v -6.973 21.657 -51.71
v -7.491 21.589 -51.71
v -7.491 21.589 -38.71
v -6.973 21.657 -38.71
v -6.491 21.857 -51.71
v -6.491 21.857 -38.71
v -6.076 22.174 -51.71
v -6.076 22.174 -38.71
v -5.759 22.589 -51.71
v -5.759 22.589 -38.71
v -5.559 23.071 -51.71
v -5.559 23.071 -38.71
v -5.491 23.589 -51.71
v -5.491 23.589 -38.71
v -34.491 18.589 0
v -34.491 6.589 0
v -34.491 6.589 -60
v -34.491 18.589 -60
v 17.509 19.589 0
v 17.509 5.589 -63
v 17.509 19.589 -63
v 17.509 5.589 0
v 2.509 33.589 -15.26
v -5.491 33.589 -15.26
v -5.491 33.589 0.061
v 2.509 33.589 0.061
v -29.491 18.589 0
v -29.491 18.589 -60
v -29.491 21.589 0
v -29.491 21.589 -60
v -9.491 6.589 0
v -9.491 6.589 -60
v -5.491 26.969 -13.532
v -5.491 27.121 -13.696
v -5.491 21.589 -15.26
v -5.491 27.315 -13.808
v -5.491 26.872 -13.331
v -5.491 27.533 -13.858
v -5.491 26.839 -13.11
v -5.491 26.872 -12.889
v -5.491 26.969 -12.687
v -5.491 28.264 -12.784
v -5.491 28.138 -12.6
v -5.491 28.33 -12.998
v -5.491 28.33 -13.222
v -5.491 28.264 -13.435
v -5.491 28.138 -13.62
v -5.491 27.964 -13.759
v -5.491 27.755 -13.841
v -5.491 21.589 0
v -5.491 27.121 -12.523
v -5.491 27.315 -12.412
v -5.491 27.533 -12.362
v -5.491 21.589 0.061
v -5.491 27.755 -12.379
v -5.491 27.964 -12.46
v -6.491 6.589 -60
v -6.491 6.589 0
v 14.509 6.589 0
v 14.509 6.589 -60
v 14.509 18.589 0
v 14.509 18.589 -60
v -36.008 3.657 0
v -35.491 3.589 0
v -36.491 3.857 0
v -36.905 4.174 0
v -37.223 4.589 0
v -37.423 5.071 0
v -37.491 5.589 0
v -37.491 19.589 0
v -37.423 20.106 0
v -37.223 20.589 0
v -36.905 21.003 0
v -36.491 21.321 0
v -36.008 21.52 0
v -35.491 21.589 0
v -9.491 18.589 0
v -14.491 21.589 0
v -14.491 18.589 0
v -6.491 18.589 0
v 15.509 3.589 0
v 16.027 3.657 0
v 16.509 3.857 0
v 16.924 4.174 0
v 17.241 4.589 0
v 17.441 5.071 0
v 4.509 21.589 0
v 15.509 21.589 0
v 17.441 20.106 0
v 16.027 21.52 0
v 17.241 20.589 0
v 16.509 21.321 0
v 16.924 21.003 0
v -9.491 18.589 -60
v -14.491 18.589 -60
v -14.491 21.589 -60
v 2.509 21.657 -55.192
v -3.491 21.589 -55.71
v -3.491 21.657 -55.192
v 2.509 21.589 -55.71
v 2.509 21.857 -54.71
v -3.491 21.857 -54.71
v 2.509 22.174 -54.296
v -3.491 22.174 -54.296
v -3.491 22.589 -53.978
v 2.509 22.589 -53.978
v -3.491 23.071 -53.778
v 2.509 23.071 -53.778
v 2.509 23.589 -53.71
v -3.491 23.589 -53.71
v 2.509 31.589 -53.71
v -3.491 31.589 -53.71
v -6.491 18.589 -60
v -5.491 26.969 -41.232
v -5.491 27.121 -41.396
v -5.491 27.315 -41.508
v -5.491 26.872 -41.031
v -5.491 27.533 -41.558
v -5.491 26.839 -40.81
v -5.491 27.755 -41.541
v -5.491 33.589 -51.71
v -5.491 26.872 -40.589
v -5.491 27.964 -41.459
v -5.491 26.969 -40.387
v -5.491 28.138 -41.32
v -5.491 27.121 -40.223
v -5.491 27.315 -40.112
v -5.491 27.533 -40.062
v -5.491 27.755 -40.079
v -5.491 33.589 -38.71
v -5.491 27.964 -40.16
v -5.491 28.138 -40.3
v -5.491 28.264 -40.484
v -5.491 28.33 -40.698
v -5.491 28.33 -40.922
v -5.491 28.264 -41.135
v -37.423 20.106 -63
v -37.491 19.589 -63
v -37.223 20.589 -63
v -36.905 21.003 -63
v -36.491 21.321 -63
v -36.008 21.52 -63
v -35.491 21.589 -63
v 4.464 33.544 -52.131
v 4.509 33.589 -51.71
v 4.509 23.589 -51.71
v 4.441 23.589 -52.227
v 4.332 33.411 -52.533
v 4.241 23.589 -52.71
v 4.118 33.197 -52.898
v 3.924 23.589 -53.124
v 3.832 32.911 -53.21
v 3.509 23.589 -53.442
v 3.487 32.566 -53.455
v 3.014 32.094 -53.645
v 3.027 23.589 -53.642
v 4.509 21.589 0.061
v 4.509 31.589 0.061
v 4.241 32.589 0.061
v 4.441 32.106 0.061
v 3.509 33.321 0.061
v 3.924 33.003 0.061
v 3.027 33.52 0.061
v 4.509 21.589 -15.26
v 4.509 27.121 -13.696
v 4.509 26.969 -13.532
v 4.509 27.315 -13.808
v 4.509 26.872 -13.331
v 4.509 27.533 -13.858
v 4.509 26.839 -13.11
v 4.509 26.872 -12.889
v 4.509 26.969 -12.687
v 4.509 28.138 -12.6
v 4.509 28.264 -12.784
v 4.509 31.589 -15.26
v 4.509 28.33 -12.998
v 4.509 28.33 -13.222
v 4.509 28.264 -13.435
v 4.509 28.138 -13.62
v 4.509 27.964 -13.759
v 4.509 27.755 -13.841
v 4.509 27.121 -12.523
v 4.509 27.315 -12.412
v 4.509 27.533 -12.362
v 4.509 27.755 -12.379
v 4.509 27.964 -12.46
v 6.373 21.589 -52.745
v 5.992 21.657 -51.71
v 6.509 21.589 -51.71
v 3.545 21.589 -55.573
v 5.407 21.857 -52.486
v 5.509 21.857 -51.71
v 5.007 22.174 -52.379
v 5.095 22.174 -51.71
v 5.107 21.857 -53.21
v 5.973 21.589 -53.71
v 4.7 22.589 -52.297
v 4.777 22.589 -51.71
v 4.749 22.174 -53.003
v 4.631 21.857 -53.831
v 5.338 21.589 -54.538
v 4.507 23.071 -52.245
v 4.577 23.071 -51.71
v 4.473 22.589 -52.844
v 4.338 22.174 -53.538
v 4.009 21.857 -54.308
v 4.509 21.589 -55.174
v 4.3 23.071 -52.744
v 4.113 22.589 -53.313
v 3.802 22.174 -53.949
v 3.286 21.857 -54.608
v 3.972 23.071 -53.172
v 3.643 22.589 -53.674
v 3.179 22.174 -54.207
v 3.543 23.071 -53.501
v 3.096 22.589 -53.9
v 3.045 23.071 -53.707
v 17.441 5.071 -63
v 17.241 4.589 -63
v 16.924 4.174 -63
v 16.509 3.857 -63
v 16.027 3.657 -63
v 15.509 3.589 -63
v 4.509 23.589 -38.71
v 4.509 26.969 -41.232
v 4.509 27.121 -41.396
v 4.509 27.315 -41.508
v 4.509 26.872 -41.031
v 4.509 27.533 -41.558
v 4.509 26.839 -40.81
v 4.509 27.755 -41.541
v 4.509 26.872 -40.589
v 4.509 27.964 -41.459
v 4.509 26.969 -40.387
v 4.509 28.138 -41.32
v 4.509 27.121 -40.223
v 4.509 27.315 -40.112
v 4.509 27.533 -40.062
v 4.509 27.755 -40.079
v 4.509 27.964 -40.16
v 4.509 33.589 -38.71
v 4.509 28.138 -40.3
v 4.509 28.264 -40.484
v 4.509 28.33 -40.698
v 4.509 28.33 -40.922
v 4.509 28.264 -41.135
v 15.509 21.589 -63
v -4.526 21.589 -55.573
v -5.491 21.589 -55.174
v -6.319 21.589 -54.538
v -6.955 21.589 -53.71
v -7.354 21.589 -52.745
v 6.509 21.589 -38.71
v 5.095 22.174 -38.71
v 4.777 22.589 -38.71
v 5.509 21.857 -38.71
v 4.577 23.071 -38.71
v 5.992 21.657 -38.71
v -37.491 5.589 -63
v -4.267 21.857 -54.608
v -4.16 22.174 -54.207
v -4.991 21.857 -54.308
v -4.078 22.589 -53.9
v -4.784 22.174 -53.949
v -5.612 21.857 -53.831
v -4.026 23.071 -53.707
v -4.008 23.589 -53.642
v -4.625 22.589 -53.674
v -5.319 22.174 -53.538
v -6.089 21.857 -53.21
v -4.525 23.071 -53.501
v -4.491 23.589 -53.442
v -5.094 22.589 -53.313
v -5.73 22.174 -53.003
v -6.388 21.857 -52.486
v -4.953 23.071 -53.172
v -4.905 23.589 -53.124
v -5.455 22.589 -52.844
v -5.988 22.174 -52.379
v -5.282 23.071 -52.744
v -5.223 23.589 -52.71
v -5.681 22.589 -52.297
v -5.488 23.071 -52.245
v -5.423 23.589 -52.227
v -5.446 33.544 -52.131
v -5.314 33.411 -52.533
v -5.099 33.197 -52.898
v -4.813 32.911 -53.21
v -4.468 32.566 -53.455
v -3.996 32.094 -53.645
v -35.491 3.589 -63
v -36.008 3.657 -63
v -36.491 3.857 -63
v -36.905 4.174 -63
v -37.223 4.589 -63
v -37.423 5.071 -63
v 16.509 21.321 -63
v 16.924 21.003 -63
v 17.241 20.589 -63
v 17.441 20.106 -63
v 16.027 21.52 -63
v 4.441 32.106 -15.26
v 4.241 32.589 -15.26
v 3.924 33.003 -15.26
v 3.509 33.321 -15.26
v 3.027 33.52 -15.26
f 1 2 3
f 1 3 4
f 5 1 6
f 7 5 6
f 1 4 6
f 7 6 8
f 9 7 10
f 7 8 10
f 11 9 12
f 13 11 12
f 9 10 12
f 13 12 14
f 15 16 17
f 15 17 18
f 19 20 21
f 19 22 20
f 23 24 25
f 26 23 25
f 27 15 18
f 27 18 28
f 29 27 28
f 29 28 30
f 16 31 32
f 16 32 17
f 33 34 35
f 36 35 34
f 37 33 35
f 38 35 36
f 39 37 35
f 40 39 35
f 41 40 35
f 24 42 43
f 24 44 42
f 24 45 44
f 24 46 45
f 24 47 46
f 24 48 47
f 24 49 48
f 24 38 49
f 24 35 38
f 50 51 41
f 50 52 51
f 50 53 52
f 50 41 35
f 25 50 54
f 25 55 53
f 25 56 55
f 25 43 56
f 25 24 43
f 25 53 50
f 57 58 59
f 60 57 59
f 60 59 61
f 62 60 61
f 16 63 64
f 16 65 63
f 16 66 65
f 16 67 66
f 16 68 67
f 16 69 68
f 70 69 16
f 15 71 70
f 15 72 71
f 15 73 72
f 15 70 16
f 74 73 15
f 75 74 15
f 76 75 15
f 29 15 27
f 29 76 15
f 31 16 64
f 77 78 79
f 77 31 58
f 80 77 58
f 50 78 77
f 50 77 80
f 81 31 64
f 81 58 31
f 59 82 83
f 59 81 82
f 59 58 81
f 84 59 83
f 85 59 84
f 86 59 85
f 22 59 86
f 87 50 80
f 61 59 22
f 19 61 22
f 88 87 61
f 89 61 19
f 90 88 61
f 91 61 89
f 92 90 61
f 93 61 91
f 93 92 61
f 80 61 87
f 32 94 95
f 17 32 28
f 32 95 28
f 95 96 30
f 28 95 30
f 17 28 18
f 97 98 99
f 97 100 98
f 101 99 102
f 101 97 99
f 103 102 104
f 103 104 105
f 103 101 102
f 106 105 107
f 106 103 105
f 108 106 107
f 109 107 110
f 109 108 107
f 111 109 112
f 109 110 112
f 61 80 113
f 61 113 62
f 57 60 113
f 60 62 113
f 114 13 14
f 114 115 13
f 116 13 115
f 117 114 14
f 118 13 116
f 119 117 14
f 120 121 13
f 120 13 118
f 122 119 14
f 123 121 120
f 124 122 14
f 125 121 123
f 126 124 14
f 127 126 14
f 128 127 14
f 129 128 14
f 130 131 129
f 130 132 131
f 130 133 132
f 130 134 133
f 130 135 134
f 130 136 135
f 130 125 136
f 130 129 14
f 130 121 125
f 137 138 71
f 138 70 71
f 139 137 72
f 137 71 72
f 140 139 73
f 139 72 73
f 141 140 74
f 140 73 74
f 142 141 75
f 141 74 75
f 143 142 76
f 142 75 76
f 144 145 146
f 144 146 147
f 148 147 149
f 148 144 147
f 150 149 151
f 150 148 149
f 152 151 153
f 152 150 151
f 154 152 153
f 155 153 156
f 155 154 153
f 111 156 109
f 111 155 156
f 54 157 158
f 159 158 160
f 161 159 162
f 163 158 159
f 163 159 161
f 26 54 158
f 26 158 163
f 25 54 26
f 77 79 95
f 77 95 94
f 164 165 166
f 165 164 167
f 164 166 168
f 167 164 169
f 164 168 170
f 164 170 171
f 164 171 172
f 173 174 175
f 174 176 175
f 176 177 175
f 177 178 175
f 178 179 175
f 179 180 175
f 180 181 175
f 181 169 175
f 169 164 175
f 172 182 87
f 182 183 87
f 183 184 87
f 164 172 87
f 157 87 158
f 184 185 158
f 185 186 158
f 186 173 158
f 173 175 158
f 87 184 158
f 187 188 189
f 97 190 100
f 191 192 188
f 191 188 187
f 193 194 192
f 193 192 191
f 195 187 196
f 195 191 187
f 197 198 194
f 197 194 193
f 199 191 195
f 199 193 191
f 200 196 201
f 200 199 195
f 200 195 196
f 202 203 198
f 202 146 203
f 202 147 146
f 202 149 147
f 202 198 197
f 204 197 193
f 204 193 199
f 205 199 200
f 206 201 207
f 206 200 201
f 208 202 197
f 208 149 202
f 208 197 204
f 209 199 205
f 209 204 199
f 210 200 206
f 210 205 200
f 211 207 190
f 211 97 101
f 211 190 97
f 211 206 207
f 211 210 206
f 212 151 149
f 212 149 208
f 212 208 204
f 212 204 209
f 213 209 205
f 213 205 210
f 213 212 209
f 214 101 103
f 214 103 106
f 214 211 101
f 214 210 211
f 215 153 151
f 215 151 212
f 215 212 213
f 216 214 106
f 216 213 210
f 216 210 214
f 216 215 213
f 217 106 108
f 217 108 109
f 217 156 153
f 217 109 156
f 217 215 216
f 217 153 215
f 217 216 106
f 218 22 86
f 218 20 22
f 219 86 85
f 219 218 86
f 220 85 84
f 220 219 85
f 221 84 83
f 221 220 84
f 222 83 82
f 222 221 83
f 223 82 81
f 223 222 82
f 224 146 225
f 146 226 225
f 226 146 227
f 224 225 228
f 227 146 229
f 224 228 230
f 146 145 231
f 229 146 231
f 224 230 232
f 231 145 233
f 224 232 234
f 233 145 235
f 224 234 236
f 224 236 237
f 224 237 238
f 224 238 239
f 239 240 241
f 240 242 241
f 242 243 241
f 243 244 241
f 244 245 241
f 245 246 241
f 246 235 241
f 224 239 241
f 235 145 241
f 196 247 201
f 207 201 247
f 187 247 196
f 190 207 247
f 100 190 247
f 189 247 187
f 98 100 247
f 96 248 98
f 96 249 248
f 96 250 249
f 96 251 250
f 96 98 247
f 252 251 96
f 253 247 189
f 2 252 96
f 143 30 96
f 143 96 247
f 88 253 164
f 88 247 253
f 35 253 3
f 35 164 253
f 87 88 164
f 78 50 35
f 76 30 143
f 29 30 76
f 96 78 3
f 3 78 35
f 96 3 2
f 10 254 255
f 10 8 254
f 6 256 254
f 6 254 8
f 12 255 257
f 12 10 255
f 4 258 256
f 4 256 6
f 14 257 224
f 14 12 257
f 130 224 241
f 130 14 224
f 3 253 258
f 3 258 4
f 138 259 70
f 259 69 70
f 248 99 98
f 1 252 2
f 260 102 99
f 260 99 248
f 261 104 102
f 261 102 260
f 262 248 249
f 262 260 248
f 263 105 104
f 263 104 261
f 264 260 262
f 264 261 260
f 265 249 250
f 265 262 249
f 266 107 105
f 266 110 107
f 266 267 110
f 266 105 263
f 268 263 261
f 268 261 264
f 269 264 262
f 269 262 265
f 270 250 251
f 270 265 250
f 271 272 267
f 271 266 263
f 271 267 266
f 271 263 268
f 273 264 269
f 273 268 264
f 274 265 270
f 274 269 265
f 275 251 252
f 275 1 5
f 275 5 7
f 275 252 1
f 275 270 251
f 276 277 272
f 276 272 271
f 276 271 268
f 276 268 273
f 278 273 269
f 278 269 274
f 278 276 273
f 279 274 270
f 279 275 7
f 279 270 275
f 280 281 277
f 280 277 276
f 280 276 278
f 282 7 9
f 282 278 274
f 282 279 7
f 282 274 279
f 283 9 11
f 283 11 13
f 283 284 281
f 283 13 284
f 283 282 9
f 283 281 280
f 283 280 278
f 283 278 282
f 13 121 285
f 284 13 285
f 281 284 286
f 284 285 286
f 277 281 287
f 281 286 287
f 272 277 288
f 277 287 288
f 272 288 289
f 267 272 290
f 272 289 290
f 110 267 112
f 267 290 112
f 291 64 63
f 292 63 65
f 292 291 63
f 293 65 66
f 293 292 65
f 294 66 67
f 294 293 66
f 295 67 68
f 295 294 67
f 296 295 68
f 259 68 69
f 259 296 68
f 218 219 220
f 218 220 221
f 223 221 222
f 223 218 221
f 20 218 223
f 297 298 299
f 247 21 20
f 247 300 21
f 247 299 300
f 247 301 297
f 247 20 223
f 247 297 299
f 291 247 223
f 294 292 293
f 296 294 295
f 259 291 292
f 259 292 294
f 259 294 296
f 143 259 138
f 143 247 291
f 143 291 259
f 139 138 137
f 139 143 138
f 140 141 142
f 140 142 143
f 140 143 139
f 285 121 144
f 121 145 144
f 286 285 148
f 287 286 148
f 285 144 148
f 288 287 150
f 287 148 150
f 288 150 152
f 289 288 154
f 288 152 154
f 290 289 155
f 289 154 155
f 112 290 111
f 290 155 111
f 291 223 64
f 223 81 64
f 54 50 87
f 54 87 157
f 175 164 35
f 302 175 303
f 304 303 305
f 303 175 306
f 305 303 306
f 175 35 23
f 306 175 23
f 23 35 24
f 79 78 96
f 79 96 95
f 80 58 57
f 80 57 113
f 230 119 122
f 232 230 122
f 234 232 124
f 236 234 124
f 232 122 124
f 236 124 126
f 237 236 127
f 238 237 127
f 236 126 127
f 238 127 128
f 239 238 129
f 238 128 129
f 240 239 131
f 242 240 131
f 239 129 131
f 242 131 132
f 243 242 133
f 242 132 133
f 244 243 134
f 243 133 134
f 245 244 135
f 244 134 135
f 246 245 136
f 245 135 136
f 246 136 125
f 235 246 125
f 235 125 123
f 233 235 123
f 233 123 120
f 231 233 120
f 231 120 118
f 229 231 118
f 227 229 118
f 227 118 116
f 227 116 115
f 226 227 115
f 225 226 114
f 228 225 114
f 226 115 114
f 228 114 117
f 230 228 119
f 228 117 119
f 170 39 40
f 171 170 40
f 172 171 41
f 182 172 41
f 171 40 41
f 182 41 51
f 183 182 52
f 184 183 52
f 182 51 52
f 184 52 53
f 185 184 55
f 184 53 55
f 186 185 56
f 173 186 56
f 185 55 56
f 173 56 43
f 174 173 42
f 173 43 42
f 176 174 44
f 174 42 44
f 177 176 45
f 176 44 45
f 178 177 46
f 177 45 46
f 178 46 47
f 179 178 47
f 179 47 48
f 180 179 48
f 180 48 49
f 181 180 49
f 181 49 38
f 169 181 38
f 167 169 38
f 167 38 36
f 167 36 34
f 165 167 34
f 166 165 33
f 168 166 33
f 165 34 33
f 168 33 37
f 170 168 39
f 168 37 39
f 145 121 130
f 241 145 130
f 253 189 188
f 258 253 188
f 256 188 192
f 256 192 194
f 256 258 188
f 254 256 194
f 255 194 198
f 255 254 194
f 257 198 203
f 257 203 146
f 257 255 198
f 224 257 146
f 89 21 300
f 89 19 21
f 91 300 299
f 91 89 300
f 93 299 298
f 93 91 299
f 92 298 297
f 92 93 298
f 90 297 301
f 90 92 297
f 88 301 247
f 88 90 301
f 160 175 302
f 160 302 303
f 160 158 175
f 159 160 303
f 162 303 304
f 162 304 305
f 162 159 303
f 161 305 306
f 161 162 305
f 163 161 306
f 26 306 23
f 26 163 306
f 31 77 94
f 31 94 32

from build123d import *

# Parameters (mm, degrees)
SKETCH1_W           = 21
SKETCH1_H           = 12
BOSS_EXTRUDE1_DEPTH = 60
SKETCH2_W           = 15
SKETCH2_H           = 12
SKETCH2_R           = 0.75
SKETCH2_W_2         = 15.320483989
BOSS_EXTRUDE2_DEPTH = 10
SKETCH3_W           = 55
SKETCH3_H           = 18
BOSS_EXTRUDE3_DEPTH = 3
FILLET1_R           = 2


with BuildPart() as part:
    # Sketch1 → Boss-Extrude1 (new body)
    with BuildSketch(Plane.XY):
        Polygon((17.509291985, 21.588576814), (-9.490708015, 21.588576814), (-14.490708015, 21.588576814), (-14.490708015, 18.588576814), (-9.490708015, 18.588576814), (-9.490708015, 6.588576814), (-34.490708015, 6.588576814), (-34.490708015, 18.588576814), (-29.490708015, 18.588576814), (-29.490708015, 21.588576814), (-34.490708015, 21.588576814), (-37.490708015, 21.588576814), (-37.490708015, 3.588576814), (17.509291985, 3.588576814), align=None)
        with Locations((4.009291985, 12.588576814)):
            Rectangle(SKETCH1_W, SKETCH1_H, mode=Mode.SUBTRACT)
    extrude(amount=-BOSS_EXTRUDE1_DEPTH)

    # Sketch2 → Boss-Extrude2 (add)
    # profile 1 of 2: a face of its own
    with BuildSketch(Plane.ZY.offset(5.490708015)):
        with Locations((-46.209795844, 27.588576814)):
            Rectangle(SKETCH2_W, SKETCH2_H)
        with Locations(Location((-40.809795844, 27.588576814, 0), (0, 0, 270))):
            Circle(SKETCH2_R, mode=Mode.SUBTRACT)
    # profile 2 of 2: a face of its own
    with BuildSketch(Plane.ZY.offset(5.490708015)):
        with Locations((-7.59955385, 27.588576814)):
            Rectangle(SKETCH2_W_2, SKETCH2_H)
        with Locations(Location((-13.109795844, 27.588576814, 0), (0, 0, 270))):
            Circle(SKETCH2_R, mode=Mode.SUBTRACT)
    extrude(amount=-BOSS_EXTRUDE2_DEPTH)

    # Sketch3 → Boss-Extrude3 (add)
    with BuildSketch(Plane(origin=(0, 0, -60), x_dir=(-1, 0, 0), z_dir=(0, 0, -1))):
        with Locations((9.990708015, 12.588576814)):
            Rectangle(SKETCH3_W, SKETCH3_H)
    extrude(amount=BOSS_EXTRUDE3_DEPTH)

    # Fillet1
    fillet1_edges = [part.edges().sort_by_distance(p)[0] for p in [
        (17.509291985, 21.588576814, -31.5),
        (17.509291985, 3.588576814, -31.5),
        (-37.490708015, 3.588576814, -31.5),
        (-37.490708015, 21.588576814, -31.5),
        (-5.490708015, 21.588576814, -46.209795844),
        (4.509291985, 33.588576814, -7.59955385),
        (4.509291985, 27.588576814, -53.709795844),
        (-5.490708015, 27.588576814, -53.709795844),
        (-0.490708015, 33.588576814, -53.709795844),
        (4.509291985, 21.588576814, -46.209795844),
        (-0.490708015, 21.588576814, -53.709795844),
    ]]
    fillet(fillet1_edges, radius=FILLET1_R)


solid = part.part
